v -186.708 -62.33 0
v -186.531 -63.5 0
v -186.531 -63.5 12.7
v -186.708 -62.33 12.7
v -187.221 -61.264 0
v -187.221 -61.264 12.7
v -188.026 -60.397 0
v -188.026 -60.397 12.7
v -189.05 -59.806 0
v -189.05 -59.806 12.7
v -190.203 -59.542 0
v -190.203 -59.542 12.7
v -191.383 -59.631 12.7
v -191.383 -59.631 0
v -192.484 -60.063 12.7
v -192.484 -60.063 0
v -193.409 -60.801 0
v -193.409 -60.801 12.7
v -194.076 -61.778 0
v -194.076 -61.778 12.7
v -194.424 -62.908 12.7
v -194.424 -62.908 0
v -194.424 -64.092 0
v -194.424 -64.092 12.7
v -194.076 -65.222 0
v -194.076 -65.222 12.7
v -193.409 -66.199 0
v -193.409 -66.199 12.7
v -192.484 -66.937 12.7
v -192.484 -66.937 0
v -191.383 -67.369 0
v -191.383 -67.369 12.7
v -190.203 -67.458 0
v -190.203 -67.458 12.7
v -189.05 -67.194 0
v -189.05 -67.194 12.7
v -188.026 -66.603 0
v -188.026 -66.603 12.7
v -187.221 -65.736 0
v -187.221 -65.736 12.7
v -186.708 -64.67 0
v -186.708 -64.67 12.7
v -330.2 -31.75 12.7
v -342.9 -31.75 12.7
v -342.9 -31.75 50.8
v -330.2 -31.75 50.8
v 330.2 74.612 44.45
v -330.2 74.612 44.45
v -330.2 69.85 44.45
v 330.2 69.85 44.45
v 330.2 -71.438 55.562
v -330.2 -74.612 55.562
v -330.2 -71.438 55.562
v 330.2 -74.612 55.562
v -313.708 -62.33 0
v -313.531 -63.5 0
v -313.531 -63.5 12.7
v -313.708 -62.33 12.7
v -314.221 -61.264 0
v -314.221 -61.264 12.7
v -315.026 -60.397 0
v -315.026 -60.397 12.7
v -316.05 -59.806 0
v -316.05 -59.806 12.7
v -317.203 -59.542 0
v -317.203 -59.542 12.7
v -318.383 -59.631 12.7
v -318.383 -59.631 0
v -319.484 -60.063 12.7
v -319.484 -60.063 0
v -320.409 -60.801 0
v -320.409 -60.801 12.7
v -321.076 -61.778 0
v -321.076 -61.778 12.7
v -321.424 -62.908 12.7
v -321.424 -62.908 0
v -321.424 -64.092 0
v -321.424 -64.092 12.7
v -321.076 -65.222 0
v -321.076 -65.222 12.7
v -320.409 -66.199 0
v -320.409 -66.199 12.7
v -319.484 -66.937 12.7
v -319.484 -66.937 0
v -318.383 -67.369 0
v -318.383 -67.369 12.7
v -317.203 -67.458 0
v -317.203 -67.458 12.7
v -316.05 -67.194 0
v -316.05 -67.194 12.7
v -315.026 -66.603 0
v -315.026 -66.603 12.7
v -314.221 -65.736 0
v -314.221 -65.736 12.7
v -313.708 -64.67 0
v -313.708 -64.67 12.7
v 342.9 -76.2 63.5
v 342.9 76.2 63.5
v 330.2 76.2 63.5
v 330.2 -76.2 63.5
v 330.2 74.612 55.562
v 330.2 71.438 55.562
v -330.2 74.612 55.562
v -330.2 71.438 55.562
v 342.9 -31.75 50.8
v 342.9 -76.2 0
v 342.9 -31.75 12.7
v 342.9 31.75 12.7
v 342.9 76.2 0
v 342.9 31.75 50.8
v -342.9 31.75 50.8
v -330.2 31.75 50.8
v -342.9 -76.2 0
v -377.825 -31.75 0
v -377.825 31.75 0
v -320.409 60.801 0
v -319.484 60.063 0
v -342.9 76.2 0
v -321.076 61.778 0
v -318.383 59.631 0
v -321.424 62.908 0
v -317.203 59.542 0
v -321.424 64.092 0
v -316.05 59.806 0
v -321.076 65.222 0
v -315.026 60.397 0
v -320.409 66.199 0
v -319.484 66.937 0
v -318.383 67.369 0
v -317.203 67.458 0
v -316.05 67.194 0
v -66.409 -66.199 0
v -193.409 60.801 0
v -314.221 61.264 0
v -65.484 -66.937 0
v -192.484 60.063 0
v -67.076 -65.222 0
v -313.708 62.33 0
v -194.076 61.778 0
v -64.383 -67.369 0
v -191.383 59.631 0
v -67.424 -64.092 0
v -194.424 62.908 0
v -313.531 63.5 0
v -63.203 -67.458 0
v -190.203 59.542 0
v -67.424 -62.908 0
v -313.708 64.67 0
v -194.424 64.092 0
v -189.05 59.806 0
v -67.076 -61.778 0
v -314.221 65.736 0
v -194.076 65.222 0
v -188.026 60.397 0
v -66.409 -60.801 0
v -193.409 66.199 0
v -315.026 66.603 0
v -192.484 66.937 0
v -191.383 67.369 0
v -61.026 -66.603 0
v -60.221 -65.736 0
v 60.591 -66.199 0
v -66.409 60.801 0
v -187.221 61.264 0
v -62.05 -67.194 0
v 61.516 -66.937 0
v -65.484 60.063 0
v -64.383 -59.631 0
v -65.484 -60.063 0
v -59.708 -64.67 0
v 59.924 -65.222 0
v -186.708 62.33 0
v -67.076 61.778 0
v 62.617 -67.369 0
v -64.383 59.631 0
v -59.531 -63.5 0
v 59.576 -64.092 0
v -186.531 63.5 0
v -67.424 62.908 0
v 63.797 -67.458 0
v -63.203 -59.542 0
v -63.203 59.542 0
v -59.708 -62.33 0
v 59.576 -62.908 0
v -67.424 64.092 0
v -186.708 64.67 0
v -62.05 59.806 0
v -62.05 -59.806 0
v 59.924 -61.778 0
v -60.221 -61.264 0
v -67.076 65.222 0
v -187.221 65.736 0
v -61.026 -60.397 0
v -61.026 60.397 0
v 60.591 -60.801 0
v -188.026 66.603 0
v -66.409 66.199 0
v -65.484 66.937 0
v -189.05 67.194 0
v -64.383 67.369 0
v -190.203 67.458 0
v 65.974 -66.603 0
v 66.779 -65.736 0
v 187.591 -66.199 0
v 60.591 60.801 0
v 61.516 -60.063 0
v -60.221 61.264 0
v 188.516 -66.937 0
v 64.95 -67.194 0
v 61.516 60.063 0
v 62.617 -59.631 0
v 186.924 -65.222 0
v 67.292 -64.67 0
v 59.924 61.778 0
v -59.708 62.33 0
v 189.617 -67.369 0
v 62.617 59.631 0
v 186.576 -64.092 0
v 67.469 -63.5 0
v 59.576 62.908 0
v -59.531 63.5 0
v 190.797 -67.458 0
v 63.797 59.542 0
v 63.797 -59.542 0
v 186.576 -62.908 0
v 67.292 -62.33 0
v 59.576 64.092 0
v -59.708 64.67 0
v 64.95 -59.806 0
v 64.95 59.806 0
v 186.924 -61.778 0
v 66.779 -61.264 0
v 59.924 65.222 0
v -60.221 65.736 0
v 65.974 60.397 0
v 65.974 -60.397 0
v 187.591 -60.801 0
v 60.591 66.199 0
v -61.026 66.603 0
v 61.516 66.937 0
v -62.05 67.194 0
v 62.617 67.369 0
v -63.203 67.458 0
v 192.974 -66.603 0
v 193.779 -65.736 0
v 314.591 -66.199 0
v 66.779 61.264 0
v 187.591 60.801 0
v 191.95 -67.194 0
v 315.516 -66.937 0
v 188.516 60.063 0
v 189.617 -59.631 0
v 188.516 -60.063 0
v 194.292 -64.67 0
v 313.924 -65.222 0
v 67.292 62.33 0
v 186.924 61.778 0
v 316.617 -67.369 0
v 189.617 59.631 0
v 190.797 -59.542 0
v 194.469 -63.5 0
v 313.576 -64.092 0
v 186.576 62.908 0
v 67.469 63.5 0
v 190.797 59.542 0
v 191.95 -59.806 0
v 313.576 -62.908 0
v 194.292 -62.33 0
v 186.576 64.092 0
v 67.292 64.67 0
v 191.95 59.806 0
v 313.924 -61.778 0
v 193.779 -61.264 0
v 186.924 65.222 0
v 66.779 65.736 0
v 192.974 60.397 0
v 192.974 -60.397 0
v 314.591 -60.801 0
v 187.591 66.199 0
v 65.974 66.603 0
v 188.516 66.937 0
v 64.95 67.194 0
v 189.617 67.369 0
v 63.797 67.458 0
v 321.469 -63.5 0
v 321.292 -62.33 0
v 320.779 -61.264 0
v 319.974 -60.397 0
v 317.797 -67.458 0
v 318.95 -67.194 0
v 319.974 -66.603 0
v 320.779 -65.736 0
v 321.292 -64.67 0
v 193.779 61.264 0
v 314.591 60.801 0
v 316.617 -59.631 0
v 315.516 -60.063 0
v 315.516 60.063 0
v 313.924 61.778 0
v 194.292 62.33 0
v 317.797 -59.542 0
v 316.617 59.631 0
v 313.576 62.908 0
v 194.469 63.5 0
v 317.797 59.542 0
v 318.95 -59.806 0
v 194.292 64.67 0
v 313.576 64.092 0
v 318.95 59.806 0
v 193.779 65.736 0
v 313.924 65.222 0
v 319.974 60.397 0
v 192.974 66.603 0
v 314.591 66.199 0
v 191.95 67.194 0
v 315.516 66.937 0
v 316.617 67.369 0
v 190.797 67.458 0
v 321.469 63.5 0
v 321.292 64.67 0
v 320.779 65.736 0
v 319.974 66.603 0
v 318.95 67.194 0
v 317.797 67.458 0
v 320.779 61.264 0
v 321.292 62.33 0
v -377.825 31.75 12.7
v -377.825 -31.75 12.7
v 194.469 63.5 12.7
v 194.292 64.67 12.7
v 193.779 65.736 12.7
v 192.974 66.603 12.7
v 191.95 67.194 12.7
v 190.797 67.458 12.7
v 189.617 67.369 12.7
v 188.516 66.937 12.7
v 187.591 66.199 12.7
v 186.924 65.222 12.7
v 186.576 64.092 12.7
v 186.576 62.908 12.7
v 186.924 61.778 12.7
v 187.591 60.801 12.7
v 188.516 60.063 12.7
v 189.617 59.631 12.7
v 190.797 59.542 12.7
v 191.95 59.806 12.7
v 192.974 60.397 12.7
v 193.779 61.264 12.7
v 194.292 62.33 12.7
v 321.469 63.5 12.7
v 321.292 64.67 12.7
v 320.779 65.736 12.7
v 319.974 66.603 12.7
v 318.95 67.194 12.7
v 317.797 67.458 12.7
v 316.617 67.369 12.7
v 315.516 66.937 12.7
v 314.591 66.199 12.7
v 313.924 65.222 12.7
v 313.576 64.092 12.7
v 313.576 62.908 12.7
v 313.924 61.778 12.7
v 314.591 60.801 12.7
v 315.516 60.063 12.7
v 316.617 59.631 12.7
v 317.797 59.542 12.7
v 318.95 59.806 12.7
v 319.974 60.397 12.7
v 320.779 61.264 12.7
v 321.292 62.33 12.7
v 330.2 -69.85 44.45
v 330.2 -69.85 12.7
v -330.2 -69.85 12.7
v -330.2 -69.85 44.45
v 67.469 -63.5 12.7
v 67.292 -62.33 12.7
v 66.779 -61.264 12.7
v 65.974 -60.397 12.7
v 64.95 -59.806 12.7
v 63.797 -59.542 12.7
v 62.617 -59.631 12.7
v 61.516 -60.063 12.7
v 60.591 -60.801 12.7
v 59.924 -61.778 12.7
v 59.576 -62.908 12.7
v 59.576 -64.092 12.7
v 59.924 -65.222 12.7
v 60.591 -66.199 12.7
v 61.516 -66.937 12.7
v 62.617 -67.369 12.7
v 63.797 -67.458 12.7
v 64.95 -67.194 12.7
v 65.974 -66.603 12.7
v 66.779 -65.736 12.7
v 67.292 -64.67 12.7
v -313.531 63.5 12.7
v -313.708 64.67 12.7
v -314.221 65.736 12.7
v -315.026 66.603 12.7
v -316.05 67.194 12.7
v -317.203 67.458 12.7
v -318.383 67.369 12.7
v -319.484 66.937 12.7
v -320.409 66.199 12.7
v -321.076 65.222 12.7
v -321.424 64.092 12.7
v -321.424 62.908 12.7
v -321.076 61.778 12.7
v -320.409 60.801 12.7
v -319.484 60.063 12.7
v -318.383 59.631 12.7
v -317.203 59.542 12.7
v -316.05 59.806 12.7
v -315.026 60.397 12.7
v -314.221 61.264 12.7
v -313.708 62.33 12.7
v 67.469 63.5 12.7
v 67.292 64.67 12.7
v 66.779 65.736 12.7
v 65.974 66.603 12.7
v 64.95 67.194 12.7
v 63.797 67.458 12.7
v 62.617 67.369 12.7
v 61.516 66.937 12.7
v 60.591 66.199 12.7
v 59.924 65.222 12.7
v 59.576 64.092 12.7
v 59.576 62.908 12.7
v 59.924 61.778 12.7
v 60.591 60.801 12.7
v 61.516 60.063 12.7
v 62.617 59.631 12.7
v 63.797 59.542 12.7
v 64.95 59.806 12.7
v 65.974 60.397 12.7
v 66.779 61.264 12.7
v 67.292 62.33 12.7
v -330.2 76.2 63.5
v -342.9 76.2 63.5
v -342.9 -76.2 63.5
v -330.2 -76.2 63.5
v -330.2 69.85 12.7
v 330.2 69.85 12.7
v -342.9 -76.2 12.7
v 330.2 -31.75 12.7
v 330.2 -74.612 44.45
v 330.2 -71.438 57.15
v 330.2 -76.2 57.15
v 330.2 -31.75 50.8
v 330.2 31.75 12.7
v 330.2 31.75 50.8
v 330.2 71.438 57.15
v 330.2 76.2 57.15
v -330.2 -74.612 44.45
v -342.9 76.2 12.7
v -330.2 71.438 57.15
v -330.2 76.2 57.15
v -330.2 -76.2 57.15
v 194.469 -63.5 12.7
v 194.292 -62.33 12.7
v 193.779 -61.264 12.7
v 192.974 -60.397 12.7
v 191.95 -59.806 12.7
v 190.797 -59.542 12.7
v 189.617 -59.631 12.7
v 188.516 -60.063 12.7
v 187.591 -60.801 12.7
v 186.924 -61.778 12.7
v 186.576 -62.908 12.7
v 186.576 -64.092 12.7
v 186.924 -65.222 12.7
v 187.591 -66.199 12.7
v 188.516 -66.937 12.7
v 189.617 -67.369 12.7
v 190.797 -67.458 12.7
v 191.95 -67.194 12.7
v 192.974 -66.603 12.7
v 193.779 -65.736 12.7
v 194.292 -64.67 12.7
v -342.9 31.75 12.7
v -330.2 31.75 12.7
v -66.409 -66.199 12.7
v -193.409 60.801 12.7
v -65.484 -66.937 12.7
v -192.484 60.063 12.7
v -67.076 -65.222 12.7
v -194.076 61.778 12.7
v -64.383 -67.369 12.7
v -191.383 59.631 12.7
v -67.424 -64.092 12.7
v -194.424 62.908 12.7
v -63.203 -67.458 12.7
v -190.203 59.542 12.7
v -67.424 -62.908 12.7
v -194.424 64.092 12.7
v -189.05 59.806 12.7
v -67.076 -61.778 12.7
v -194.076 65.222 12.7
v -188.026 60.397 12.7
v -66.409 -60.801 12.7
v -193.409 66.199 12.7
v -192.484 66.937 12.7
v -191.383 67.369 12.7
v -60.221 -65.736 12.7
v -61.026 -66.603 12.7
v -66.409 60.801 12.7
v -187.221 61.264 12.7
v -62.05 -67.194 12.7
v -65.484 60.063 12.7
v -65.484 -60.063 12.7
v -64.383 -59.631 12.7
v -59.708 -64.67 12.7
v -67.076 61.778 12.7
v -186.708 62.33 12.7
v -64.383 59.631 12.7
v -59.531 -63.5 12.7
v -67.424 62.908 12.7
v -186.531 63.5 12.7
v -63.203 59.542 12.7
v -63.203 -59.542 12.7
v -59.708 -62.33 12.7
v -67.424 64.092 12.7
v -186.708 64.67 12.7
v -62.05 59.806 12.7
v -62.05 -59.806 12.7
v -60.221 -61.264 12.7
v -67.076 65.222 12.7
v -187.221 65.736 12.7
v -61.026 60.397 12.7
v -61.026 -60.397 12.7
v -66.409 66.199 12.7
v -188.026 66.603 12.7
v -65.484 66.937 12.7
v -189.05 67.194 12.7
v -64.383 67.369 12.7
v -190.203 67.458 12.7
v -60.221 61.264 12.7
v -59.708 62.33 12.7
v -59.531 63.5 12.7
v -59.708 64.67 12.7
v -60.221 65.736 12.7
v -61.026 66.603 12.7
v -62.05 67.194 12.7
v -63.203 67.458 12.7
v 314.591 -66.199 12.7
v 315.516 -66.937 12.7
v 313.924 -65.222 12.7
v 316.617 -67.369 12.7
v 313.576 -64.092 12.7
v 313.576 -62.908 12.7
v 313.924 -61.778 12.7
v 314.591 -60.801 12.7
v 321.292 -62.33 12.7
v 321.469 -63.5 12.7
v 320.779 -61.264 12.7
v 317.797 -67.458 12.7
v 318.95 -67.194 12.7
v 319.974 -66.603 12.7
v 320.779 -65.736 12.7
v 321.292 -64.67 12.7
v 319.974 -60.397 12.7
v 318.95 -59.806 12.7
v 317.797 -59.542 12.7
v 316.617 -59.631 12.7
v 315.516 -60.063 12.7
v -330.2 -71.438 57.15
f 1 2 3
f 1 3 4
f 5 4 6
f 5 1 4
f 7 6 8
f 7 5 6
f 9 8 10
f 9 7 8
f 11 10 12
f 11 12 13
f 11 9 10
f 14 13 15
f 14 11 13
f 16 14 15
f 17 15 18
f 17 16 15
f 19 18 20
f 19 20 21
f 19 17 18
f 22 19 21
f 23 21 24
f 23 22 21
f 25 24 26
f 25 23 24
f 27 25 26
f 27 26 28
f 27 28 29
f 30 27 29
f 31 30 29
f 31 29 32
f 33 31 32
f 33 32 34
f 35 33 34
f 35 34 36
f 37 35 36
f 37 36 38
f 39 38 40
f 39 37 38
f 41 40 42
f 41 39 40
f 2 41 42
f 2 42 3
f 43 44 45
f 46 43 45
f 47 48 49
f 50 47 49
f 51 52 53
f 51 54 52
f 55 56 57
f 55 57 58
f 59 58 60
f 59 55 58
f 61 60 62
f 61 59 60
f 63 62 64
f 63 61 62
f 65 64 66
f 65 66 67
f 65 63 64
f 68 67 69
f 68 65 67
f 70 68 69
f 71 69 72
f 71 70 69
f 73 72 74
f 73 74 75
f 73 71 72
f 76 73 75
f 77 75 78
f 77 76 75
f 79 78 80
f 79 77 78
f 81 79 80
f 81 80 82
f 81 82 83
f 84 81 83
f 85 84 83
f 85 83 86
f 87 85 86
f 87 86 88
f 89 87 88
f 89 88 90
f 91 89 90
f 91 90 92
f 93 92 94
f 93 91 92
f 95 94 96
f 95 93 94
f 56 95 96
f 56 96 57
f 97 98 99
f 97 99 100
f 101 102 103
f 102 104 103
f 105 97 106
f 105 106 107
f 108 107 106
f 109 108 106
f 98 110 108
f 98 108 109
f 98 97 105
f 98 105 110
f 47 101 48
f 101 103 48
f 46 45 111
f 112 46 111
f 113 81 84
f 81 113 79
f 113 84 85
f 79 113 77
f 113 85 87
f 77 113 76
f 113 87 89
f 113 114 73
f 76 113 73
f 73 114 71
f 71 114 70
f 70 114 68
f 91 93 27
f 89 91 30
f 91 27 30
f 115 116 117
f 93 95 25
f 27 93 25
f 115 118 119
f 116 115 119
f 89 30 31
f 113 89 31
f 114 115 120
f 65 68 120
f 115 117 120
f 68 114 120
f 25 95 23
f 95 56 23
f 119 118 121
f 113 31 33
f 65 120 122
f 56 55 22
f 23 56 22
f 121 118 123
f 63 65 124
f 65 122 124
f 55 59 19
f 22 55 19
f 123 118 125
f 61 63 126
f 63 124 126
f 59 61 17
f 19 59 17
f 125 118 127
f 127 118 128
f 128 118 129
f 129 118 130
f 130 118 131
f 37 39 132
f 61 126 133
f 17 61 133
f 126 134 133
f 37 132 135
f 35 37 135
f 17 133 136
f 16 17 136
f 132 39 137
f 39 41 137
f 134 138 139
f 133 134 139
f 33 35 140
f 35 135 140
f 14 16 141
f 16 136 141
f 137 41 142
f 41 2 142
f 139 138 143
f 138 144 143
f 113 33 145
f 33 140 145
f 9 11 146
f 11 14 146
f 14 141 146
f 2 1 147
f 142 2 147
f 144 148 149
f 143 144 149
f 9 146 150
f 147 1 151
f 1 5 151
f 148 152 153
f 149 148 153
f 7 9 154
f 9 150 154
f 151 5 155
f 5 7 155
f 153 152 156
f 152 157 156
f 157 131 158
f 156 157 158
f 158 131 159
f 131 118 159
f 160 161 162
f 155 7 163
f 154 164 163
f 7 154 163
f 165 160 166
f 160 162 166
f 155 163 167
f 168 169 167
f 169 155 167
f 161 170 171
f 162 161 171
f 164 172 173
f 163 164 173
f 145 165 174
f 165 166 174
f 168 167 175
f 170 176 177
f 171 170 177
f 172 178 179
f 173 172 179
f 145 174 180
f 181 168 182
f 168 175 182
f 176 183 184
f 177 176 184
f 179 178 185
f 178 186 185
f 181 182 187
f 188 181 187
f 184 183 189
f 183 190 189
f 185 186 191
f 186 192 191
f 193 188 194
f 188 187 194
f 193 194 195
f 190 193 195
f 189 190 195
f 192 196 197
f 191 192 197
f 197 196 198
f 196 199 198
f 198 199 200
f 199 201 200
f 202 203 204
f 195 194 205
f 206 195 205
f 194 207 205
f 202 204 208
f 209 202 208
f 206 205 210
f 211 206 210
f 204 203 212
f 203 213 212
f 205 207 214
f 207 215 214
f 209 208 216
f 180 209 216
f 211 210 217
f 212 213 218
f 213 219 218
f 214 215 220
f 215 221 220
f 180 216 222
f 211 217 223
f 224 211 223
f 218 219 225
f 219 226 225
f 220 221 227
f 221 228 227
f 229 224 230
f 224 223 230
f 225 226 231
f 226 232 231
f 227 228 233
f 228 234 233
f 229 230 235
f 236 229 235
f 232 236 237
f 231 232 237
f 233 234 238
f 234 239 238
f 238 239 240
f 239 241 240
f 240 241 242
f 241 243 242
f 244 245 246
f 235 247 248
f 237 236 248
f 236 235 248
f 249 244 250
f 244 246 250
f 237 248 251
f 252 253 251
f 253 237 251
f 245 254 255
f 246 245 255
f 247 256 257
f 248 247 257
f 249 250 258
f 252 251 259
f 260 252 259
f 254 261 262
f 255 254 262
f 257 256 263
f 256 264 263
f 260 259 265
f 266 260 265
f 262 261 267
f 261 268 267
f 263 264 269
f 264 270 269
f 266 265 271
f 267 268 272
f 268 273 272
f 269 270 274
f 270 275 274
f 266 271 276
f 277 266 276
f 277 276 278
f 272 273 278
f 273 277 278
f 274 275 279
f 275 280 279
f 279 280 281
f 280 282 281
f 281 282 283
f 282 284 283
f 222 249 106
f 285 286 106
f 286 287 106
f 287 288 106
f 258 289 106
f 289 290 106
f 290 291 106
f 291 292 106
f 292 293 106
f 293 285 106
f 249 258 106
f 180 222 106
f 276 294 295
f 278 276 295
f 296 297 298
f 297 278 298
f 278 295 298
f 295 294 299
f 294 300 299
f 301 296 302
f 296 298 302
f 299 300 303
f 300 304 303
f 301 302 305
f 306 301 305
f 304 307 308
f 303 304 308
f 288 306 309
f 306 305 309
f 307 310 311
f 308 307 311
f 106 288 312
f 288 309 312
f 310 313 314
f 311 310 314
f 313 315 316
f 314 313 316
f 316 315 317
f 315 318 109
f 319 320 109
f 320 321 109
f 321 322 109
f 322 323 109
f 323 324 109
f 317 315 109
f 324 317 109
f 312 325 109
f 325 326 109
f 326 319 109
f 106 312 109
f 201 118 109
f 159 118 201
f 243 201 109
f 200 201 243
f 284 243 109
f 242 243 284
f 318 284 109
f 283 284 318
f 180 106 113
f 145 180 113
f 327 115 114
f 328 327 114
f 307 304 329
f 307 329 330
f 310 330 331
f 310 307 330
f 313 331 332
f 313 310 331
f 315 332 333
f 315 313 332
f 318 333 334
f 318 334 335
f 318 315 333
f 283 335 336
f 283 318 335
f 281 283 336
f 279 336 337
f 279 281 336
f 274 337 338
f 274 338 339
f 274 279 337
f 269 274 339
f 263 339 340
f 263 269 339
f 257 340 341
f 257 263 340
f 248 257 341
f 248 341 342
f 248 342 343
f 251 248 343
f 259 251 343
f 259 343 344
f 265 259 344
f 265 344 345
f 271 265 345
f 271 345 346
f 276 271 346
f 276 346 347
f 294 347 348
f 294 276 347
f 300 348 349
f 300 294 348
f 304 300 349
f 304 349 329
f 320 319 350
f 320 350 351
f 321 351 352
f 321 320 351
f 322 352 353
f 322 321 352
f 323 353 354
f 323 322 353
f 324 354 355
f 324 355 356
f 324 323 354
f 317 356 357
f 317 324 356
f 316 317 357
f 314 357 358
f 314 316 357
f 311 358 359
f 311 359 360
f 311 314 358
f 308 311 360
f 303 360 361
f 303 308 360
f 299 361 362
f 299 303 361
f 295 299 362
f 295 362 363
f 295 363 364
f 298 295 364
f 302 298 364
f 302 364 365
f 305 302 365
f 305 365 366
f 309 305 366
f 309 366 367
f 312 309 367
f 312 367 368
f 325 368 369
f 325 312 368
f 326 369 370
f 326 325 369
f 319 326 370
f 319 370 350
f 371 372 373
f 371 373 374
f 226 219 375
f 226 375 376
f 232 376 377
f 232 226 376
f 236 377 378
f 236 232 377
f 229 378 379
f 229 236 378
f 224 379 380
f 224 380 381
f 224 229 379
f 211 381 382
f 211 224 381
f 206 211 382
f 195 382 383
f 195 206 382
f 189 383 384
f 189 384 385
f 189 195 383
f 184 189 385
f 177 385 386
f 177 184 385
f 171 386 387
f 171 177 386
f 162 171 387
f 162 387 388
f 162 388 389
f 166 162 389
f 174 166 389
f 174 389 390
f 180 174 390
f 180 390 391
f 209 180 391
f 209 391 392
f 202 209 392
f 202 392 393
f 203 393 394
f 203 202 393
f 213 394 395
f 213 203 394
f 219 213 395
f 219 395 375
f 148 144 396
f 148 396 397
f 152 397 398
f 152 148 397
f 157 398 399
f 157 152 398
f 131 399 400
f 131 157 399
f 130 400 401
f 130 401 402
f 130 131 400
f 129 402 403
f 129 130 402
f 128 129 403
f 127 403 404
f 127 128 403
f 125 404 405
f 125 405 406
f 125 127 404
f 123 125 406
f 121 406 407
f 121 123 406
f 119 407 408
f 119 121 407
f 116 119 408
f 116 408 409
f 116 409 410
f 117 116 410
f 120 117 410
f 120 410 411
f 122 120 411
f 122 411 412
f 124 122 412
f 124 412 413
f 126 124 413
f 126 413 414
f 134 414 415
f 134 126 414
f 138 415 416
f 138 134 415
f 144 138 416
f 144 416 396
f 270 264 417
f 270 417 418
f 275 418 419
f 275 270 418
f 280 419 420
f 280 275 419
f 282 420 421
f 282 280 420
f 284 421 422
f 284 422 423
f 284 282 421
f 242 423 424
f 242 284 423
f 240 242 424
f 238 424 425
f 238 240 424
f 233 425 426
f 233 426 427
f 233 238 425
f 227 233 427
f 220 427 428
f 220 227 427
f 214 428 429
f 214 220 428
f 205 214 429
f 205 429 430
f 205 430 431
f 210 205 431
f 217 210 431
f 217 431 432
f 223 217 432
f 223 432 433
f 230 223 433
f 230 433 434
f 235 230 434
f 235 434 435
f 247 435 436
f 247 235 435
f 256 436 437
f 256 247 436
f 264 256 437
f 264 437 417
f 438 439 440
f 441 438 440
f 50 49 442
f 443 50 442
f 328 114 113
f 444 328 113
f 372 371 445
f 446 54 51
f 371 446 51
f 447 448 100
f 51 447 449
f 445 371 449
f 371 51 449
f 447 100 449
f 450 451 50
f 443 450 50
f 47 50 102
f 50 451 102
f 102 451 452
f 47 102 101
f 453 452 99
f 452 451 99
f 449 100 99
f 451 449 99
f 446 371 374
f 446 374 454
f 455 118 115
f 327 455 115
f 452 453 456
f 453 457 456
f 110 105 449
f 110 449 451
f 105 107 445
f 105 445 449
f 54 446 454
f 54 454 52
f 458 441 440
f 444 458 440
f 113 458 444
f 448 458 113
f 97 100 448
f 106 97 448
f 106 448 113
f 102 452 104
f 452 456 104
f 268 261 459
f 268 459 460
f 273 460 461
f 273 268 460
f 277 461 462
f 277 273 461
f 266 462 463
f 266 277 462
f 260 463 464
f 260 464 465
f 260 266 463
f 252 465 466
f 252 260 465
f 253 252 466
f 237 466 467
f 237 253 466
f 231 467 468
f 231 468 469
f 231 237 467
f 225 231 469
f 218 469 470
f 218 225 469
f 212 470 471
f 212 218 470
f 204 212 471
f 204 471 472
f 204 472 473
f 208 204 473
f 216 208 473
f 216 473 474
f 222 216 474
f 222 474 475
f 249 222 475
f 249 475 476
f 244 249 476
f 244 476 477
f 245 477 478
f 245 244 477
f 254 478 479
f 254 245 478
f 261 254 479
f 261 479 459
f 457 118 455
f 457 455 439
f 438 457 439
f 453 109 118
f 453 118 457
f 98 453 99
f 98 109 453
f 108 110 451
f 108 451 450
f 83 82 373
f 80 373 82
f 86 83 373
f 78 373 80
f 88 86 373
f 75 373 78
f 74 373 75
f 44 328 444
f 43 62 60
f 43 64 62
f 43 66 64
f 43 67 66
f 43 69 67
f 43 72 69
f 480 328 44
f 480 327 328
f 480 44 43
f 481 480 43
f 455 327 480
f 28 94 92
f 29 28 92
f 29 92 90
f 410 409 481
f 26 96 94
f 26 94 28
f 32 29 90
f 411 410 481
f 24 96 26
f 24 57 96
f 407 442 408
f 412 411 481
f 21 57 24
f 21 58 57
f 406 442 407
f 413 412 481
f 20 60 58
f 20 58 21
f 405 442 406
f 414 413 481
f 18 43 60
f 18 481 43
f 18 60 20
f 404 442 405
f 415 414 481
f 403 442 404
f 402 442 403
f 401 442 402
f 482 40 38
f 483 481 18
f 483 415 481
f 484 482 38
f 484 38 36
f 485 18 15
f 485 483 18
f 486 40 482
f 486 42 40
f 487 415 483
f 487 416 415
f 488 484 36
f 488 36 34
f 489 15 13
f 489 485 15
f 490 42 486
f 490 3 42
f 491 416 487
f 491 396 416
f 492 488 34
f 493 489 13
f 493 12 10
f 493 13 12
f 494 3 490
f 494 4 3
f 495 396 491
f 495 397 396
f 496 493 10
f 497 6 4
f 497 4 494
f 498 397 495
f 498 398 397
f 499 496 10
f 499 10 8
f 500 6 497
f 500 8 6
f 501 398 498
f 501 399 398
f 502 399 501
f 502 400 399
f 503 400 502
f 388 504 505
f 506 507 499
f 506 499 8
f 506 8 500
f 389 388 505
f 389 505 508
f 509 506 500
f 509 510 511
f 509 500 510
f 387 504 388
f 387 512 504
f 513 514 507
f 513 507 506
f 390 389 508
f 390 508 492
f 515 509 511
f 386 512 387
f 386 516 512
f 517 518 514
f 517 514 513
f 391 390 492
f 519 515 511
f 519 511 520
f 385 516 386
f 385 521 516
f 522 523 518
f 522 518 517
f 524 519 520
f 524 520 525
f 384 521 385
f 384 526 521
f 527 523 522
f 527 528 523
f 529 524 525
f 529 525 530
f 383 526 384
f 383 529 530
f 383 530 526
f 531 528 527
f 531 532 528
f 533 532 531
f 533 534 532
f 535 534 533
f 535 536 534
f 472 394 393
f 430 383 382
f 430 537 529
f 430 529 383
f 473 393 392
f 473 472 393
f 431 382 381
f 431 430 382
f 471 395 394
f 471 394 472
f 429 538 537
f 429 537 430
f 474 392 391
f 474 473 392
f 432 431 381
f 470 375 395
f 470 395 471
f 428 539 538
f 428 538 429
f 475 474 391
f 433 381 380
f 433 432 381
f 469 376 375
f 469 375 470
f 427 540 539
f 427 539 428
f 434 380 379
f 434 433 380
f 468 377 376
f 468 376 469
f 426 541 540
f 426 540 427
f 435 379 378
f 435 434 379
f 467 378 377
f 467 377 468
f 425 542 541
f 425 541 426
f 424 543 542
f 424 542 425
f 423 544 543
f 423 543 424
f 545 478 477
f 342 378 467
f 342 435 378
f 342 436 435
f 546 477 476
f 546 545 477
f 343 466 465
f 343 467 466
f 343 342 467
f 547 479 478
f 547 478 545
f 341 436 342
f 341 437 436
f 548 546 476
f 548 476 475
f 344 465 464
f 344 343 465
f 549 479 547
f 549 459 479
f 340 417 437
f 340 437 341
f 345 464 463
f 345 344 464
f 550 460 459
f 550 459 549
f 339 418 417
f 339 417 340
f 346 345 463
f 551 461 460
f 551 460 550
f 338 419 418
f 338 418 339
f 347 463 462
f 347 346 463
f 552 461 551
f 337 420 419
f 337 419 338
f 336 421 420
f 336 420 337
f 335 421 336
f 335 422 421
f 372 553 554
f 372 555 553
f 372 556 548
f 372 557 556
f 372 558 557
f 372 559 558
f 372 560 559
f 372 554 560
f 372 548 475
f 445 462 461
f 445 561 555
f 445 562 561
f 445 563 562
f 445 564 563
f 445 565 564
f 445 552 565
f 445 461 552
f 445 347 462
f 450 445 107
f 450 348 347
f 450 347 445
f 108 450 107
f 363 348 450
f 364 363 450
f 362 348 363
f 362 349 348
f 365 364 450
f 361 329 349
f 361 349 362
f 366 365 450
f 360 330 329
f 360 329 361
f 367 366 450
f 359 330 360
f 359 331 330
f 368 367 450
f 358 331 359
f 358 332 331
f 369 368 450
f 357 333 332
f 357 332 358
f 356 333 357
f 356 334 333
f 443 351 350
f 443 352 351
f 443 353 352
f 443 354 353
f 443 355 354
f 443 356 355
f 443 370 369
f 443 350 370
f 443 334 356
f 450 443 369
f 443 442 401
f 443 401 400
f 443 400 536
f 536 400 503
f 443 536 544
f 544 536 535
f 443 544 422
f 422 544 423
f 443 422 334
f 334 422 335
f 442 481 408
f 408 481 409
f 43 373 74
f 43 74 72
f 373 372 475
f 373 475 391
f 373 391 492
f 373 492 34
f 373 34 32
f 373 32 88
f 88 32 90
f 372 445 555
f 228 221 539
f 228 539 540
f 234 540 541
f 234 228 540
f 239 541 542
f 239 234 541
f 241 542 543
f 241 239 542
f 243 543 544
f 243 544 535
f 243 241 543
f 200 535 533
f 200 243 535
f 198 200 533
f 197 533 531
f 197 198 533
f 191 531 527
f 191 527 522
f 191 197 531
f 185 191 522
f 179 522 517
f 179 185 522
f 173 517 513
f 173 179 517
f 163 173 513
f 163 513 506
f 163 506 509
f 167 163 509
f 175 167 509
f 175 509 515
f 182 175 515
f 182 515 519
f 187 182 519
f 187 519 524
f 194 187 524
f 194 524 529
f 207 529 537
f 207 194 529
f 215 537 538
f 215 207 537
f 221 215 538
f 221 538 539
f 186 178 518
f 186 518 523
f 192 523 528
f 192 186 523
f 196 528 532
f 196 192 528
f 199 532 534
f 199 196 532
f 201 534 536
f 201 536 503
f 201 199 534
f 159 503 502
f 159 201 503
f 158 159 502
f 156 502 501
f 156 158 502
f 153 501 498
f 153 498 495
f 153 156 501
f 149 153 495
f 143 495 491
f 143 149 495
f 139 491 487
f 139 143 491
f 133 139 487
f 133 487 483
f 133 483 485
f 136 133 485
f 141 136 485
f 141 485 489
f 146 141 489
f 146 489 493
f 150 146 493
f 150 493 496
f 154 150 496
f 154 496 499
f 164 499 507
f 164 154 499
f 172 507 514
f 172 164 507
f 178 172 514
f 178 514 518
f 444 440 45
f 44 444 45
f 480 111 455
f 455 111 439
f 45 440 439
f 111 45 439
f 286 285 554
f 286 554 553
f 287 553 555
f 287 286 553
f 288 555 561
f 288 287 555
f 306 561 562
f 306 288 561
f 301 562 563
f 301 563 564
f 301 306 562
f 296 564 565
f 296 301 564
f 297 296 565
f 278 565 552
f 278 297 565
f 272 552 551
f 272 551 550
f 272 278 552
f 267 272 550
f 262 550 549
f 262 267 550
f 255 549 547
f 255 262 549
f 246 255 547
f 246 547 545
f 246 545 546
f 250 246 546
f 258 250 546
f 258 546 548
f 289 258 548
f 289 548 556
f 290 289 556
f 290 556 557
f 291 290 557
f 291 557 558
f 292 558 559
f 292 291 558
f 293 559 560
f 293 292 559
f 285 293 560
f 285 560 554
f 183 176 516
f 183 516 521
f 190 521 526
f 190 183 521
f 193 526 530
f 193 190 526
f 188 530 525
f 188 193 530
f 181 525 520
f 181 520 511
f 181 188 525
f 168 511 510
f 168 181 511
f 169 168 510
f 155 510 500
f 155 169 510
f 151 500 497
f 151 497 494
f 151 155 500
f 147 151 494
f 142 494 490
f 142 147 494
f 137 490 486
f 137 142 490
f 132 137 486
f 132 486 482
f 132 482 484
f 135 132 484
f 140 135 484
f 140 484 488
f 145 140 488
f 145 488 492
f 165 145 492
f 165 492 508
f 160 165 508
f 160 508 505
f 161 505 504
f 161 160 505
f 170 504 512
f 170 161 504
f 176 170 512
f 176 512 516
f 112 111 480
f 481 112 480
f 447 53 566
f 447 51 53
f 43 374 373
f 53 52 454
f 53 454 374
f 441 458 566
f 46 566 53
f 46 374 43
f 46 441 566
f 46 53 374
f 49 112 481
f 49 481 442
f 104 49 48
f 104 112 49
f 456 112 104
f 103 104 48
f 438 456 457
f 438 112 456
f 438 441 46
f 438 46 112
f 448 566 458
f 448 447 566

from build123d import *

# Parameters (mm, degrees)
F0_R     = 3.96875
F1_DEPTH = 12.7
F4_DEPTH = 12.7
F6_DEPTH = 12.7
F8_DEPTH = 330.2


with BuildPart() as f1:
    # F0 (on Top) → F1 (new body)
    with BuildSketch(Plane.XY):
        Polygon((342.9, 76.2), (-342.9, 76.2), (-377.825, 31.75), (-377.825, -31.75), (-342.9, -76.2), (342.9, -76.2), align=None)
        with Locations((-317.5, -63.5)):
            Circle(F0_R, mode=Mode.SUBTRACT)
        with Locations((-190.5, -63.5)):
            Circle(F0_R, mode=Mode.SUBTRACT)
        with Locations((-63.5, -63.5)):
            Circle(F0_R, mode=Mode.SUBTRACT)
        with Locations((63.5, -63.5)):
            Circle(F0_R, mode=Mode.SUBTRACT)
        with Locations((190.5, -63.5)):
            Circle(F0_R, mode=Mode.SUBTRACT)
        with Locations((317.5, -63.5)):
            Circle(F0_R, mode=Mode.SUBTRACT)
        with Locations((-317.5, 63.5)):
            Circle(F0_R, mode=Mode.SUBTRACT)
        with Locations((-190.5, 63.5)):
            Circle(F0_R, mode=Mode.SUBTRACT)
        with Locations((-63.5, 63.5)):
            Circle(F0_R, mode=Mode.SUBTRACT)
        with Locations((63.5, 63.5)):
            Circle(F0_R, mode=Mode.SUBTRACT)
        with Locations((190.5, 63.5)):
            Circle(F0_R, mode=Mode.SUBTRACT)
        with Locations((317.5, 63.5)):
            Circle(F0_R, mode=Mode.SUBTRACT)
    extrude(amount=F1_DEPTH)

    # F3 (on plane+point) → F4 (join)
    with BuildSketch(Plane.YZ.offset(-342.9)):
        Polygon((76.2, 63.5), (-76.2, 63.5), (-76.2, 12.7), (-31.75, 12.7), (-31.75, 50.8), (31.75, 50.8), (31.75, 12.7), (76.2, 12.7), align=None)
    extrude(amount=F4_DEPTH)

    # F5 (on face) → F6 (join)
    with BuildSketch(Plane.YZ.offset(342.9)):
        Polygon((-76.2, 63.5), (-76.2, 12.7), (-31.75, 12.7), (-31.75, 50.8), (31.75, 50.8), (31.75, 12.7), (76.2, 12.7), (76.2, 63.5), align=None)
    extrude(amount=-F6_DEPTH)

    # F7 (on Right) → F8 (join, symmetric)
    with BuildSketch(Plane.YZ):
        Polygon((69.85, 12.7), (76.2, 12.7), (76.2, 57.15), (71.4375, 57.15), (71.4375, 55.5625), (74.6125, 55.5625), (74.6125, 44.45), (69.85, 44.45), align=None)
        Polygon((-71.4375, 57.15), (-76.2, 57.15), (-76.2, 12.7), (-69.85, 12.7), (-69.85, 44.45), (-74.6125, 44.45), (-74.6125, 55.5625), (-71.4375, 55.5625), align=None)
    extrude(amount=F8_DEPTH, both=True)


solid = f1.part
